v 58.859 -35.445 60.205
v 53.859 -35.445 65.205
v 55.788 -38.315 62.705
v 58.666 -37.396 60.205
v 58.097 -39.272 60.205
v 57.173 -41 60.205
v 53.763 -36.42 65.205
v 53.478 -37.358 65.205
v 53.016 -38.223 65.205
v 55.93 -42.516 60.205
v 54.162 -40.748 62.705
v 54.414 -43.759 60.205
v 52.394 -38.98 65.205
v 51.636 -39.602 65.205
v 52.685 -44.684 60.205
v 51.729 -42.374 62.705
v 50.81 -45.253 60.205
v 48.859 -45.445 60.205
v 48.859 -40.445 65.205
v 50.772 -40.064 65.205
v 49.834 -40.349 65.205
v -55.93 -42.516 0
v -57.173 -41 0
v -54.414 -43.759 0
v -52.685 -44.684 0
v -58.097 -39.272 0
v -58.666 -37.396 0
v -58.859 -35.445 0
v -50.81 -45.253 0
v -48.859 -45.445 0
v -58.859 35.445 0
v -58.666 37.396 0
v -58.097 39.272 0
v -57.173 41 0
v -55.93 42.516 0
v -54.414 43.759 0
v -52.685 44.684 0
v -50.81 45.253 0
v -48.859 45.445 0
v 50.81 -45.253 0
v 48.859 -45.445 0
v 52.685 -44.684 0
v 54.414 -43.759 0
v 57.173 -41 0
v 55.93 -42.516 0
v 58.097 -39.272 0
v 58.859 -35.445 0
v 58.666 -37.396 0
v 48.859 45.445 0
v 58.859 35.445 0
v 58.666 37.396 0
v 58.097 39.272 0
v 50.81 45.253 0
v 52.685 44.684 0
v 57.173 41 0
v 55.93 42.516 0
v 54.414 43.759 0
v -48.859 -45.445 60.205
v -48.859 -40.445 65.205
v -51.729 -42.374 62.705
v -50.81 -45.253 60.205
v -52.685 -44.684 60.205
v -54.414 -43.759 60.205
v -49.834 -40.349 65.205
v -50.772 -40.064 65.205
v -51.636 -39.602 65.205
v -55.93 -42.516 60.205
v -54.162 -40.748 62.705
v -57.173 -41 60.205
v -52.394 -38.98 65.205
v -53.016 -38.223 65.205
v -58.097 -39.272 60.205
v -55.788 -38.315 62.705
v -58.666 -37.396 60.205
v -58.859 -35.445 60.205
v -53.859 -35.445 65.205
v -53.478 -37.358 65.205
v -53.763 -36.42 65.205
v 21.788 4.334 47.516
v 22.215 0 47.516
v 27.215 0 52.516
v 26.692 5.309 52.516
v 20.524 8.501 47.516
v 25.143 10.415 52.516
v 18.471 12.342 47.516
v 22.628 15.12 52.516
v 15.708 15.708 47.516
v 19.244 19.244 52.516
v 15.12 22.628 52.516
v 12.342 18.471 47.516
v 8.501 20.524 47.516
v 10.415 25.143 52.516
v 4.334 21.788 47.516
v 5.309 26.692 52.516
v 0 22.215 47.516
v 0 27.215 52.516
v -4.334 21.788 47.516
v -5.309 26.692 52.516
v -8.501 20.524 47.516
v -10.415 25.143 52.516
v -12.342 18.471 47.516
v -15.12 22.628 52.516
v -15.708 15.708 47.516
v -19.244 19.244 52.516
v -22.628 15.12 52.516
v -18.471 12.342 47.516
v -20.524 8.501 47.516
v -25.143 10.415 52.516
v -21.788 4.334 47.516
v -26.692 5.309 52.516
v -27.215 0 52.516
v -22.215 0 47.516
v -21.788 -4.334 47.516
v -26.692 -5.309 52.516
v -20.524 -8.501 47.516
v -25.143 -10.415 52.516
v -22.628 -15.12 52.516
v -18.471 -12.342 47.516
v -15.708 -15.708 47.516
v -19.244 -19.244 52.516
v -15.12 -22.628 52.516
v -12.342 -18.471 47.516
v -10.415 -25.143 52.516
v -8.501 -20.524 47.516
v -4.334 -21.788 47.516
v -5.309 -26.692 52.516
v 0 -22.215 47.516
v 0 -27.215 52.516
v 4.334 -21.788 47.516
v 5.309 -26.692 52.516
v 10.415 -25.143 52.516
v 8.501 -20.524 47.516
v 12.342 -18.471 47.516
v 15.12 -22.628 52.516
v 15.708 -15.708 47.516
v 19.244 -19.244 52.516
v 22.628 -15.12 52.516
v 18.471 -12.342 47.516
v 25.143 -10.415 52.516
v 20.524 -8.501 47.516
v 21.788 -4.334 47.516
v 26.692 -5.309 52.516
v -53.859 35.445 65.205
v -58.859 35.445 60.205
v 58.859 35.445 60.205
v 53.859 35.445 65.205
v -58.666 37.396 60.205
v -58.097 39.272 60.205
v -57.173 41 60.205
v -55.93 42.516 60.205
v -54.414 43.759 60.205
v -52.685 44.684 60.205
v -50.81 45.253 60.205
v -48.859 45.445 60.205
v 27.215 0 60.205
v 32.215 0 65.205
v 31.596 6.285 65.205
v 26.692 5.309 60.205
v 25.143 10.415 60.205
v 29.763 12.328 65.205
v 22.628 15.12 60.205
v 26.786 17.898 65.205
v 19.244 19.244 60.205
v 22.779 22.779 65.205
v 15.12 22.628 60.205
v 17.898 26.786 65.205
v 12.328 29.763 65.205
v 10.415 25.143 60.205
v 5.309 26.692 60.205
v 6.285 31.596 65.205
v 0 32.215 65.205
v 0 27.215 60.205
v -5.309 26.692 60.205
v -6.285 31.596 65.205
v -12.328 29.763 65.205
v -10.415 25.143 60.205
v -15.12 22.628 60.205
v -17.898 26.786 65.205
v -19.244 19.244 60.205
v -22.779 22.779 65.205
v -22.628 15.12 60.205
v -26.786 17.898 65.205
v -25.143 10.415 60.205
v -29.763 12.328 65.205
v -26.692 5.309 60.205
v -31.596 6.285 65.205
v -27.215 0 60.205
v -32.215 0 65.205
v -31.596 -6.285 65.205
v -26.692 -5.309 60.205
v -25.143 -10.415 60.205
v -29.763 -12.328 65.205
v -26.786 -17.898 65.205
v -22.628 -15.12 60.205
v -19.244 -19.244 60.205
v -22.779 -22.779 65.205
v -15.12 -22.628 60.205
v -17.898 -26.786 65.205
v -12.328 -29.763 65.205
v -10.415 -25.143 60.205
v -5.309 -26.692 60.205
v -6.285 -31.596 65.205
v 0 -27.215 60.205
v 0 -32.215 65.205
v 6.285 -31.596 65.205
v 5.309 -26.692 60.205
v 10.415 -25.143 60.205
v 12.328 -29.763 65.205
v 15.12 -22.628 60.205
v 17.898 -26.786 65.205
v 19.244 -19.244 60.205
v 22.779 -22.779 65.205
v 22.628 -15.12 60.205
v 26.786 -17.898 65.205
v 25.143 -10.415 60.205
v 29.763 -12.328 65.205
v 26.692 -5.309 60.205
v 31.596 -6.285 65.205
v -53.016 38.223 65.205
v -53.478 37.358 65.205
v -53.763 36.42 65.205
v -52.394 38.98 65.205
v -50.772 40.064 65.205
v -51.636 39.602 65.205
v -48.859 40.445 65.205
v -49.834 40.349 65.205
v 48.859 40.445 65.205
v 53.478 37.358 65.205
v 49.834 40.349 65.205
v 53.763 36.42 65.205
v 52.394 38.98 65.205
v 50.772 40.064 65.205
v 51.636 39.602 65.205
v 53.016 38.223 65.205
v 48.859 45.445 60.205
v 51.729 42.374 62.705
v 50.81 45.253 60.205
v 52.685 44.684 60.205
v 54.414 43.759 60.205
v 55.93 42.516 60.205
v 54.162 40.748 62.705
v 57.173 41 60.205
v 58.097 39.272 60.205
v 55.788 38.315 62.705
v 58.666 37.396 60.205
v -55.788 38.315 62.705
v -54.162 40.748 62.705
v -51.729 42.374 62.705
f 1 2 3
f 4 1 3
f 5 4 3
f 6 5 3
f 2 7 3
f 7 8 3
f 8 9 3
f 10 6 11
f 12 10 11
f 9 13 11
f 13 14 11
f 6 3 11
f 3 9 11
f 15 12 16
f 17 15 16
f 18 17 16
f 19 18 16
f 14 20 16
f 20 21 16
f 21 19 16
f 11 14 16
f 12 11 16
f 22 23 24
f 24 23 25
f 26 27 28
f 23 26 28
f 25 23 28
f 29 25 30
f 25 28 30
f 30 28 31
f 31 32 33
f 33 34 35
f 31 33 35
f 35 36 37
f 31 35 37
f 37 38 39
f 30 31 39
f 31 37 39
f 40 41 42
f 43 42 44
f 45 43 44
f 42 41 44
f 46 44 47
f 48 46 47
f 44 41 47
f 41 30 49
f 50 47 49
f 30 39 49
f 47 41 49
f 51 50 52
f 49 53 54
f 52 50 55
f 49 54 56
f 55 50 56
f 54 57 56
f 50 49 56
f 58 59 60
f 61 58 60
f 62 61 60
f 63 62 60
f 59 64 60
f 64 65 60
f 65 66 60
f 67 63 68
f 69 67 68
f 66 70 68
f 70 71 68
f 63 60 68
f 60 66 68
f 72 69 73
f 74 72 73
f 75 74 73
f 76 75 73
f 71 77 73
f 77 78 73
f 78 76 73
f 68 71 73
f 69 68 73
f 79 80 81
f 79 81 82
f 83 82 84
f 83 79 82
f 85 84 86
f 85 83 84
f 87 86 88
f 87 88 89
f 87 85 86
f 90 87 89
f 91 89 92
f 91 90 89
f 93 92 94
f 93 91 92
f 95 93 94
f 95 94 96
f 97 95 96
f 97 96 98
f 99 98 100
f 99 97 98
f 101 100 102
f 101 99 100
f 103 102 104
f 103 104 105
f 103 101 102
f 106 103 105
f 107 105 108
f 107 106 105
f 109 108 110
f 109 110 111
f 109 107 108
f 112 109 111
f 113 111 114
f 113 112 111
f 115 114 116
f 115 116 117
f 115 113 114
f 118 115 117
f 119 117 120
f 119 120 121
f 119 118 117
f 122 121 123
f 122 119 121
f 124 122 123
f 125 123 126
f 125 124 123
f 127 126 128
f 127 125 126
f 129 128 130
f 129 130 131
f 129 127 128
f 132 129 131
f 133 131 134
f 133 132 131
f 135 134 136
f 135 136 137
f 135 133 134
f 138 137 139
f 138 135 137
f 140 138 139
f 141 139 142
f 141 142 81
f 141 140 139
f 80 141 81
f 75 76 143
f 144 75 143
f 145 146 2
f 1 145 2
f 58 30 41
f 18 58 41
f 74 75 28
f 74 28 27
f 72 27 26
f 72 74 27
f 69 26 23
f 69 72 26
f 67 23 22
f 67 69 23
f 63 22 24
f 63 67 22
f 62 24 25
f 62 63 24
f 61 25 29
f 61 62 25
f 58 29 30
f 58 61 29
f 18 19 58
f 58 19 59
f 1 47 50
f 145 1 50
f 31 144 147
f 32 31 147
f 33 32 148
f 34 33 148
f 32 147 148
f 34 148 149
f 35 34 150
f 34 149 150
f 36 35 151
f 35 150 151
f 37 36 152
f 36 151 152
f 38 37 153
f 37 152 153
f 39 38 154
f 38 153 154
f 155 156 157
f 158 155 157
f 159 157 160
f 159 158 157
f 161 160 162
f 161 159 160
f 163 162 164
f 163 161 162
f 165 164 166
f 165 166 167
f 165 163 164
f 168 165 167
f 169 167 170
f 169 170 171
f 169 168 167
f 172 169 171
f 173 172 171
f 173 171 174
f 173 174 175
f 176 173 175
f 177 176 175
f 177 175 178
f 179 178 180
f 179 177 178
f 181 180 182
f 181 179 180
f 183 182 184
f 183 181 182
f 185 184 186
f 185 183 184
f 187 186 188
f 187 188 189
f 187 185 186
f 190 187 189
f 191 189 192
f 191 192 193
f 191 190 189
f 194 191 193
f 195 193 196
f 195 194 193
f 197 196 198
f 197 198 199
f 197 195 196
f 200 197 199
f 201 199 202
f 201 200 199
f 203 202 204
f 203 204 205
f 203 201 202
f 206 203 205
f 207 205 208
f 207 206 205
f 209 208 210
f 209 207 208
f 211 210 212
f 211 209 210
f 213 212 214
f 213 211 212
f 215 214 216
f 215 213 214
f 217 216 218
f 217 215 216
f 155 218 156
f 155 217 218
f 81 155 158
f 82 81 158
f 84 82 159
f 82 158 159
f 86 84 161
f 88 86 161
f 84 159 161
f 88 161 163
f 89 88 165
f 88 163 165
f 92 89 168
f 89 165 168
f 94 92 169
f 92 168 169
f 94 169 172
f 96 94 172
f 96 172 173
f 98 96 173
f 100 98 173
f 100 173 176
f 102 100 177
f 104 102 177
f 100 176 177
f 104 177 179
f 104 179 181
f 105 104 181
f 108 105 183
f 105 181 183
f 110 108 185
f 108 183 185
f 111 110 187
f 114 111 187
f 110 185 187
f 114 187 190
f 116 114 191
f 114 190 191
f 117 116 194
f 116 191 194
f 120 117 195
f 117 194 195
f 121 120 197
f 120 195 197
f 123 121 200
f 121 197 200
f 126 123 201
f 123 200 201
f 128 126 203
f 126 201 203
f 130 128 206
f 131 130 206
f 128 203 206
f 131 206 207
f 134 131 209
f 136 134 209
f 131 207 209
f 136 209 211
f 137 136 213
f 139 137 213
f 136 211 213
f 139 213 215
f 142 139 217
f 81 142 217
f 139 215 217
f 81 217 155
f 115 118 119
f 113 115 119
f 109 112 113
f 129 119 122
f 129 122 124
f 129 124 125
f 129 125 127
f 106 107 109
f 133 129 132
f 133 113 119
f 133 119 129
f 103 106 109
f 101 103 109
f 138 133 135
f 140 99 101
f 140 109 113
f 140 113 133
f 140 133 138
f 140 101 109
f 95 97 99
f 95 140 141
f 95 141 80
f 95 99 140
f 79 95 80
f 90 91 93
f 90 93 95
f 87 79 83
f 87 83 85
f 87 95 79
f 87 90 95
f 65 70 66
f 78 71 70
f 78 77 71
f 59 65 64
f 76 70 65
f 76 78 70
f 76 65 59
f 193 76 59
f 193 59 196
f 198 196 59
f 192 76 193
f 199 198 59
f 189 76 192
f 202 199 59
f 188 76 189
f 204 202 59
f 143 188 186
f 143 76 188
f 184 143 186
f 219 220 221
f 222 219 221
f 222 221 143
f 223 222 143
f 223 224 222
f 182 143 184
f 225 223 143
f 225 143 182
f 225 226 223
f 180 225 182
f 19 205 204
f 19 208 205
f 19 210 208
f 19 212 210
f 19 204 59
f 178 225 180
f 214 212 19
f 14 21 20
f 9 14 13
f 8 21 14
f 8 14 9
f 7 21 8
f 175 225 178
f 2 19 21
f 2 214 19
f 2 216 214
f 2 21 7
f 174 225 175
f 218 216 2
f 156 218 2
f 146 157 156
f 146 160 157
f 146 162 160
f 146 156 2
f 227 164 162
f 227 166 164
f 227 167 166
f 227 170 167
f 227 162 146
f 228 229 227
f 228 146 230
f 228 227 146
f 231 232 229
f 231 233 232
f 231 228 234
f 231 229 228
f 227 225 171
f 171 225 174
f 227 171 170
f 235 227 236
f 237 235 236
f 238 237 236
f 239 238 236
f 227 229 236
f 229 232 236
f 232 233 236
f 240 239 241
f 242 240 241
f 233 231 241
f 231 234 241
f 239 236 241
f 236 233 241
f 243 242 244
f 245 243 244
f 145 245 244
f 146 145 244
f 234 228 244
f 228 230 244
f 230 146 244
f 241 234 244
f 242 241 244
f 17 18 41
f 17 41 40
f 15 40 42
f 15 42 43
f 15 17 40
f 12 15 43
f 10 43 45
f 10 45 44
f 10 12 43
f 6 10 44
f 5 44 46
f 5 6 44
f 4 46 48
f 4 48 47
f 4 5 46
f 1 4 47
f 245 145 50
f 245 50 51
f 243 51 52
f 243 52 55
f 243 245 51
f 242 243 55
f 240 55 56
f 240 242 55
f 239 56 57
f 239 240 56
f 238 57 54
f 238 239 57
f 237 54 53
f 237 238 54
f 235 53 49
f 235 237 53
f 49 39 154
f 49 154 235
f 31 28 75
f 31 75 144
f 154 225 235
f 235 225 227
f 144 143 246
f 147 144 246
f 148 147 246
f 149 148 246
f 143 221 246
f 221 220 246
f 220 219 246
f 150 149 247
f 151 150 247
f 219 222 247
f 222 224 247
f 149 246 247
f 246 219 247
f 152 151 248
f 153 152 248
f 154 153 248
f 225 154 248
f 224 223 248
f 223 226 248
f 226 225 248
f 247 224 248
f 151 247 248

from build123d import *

# Parameters (mm, degrees)
F0_W     = 117.717252
F0_H     = 90.889574
F1_DEPTH = 65.204948
F2_R     = 10
F3_SIZE  = 5
F4_R     = 27.215053
F5_DEPTH = 17.689077
F6_SIZE  = 5


with BuildPart() as f1:
    # F0 (on Top) → F1 (new body)
    with BuildSketch(Plane.XY):
        Rectangle(F0_W, F0_H)
    extrude(amount=F1_DEPTH)

    # F2
    f2_edges = [f1.edges().sort_by_distance(p)[0] for p in [
        (-58.858626, 45.444787, 32.602474),
        (-58.858626, -45.444787, 32.602474),
        (58.858626, -45.444787, 32.602474),
        (58.858626, 45.444787, 32.602474),
    ]]
    fillet(f2_edges, radius=F2_R)

    # F3
    f3_edges = [f1.edges().sort_by_distance(p)[0] for p in [
        (-58.858626, 0, 65.204948),
        (-55.929693, 42.515854, 65.204948),
        (-55.929693, -42.515854, 65.204948),
        (0, 45.444787, 65.204948),
        (0, -45.444787, 65.204948),
        (55.929693, 42.515854, 65.204948),
        (55.929693, -42.515854, 65.204948),
        (58.858626, 0, 65.204948),
    ]]
    chamfer(f3_edges, length=F3_SIZE)

    # F4 (on face) → F5 (cut)
    with BuildSketch(Plane.XY.offset(65.204948)):
        Circle(F4_R)
    extrude(amount=-F5_DEPTH, mode=Mode.SUBTRACT)

    # F6
    f6_edges = [f1.edges().sort_by_distance(p)[0] for p in [
        (27.215053, 0, 56.36041),
        (-27.215053, 0, 65.204948),
        (-27.215053, 0, 47.515871),
    ]]
    chamfer(f6_edges, length=F6_SIZE)


solid = f1.part
